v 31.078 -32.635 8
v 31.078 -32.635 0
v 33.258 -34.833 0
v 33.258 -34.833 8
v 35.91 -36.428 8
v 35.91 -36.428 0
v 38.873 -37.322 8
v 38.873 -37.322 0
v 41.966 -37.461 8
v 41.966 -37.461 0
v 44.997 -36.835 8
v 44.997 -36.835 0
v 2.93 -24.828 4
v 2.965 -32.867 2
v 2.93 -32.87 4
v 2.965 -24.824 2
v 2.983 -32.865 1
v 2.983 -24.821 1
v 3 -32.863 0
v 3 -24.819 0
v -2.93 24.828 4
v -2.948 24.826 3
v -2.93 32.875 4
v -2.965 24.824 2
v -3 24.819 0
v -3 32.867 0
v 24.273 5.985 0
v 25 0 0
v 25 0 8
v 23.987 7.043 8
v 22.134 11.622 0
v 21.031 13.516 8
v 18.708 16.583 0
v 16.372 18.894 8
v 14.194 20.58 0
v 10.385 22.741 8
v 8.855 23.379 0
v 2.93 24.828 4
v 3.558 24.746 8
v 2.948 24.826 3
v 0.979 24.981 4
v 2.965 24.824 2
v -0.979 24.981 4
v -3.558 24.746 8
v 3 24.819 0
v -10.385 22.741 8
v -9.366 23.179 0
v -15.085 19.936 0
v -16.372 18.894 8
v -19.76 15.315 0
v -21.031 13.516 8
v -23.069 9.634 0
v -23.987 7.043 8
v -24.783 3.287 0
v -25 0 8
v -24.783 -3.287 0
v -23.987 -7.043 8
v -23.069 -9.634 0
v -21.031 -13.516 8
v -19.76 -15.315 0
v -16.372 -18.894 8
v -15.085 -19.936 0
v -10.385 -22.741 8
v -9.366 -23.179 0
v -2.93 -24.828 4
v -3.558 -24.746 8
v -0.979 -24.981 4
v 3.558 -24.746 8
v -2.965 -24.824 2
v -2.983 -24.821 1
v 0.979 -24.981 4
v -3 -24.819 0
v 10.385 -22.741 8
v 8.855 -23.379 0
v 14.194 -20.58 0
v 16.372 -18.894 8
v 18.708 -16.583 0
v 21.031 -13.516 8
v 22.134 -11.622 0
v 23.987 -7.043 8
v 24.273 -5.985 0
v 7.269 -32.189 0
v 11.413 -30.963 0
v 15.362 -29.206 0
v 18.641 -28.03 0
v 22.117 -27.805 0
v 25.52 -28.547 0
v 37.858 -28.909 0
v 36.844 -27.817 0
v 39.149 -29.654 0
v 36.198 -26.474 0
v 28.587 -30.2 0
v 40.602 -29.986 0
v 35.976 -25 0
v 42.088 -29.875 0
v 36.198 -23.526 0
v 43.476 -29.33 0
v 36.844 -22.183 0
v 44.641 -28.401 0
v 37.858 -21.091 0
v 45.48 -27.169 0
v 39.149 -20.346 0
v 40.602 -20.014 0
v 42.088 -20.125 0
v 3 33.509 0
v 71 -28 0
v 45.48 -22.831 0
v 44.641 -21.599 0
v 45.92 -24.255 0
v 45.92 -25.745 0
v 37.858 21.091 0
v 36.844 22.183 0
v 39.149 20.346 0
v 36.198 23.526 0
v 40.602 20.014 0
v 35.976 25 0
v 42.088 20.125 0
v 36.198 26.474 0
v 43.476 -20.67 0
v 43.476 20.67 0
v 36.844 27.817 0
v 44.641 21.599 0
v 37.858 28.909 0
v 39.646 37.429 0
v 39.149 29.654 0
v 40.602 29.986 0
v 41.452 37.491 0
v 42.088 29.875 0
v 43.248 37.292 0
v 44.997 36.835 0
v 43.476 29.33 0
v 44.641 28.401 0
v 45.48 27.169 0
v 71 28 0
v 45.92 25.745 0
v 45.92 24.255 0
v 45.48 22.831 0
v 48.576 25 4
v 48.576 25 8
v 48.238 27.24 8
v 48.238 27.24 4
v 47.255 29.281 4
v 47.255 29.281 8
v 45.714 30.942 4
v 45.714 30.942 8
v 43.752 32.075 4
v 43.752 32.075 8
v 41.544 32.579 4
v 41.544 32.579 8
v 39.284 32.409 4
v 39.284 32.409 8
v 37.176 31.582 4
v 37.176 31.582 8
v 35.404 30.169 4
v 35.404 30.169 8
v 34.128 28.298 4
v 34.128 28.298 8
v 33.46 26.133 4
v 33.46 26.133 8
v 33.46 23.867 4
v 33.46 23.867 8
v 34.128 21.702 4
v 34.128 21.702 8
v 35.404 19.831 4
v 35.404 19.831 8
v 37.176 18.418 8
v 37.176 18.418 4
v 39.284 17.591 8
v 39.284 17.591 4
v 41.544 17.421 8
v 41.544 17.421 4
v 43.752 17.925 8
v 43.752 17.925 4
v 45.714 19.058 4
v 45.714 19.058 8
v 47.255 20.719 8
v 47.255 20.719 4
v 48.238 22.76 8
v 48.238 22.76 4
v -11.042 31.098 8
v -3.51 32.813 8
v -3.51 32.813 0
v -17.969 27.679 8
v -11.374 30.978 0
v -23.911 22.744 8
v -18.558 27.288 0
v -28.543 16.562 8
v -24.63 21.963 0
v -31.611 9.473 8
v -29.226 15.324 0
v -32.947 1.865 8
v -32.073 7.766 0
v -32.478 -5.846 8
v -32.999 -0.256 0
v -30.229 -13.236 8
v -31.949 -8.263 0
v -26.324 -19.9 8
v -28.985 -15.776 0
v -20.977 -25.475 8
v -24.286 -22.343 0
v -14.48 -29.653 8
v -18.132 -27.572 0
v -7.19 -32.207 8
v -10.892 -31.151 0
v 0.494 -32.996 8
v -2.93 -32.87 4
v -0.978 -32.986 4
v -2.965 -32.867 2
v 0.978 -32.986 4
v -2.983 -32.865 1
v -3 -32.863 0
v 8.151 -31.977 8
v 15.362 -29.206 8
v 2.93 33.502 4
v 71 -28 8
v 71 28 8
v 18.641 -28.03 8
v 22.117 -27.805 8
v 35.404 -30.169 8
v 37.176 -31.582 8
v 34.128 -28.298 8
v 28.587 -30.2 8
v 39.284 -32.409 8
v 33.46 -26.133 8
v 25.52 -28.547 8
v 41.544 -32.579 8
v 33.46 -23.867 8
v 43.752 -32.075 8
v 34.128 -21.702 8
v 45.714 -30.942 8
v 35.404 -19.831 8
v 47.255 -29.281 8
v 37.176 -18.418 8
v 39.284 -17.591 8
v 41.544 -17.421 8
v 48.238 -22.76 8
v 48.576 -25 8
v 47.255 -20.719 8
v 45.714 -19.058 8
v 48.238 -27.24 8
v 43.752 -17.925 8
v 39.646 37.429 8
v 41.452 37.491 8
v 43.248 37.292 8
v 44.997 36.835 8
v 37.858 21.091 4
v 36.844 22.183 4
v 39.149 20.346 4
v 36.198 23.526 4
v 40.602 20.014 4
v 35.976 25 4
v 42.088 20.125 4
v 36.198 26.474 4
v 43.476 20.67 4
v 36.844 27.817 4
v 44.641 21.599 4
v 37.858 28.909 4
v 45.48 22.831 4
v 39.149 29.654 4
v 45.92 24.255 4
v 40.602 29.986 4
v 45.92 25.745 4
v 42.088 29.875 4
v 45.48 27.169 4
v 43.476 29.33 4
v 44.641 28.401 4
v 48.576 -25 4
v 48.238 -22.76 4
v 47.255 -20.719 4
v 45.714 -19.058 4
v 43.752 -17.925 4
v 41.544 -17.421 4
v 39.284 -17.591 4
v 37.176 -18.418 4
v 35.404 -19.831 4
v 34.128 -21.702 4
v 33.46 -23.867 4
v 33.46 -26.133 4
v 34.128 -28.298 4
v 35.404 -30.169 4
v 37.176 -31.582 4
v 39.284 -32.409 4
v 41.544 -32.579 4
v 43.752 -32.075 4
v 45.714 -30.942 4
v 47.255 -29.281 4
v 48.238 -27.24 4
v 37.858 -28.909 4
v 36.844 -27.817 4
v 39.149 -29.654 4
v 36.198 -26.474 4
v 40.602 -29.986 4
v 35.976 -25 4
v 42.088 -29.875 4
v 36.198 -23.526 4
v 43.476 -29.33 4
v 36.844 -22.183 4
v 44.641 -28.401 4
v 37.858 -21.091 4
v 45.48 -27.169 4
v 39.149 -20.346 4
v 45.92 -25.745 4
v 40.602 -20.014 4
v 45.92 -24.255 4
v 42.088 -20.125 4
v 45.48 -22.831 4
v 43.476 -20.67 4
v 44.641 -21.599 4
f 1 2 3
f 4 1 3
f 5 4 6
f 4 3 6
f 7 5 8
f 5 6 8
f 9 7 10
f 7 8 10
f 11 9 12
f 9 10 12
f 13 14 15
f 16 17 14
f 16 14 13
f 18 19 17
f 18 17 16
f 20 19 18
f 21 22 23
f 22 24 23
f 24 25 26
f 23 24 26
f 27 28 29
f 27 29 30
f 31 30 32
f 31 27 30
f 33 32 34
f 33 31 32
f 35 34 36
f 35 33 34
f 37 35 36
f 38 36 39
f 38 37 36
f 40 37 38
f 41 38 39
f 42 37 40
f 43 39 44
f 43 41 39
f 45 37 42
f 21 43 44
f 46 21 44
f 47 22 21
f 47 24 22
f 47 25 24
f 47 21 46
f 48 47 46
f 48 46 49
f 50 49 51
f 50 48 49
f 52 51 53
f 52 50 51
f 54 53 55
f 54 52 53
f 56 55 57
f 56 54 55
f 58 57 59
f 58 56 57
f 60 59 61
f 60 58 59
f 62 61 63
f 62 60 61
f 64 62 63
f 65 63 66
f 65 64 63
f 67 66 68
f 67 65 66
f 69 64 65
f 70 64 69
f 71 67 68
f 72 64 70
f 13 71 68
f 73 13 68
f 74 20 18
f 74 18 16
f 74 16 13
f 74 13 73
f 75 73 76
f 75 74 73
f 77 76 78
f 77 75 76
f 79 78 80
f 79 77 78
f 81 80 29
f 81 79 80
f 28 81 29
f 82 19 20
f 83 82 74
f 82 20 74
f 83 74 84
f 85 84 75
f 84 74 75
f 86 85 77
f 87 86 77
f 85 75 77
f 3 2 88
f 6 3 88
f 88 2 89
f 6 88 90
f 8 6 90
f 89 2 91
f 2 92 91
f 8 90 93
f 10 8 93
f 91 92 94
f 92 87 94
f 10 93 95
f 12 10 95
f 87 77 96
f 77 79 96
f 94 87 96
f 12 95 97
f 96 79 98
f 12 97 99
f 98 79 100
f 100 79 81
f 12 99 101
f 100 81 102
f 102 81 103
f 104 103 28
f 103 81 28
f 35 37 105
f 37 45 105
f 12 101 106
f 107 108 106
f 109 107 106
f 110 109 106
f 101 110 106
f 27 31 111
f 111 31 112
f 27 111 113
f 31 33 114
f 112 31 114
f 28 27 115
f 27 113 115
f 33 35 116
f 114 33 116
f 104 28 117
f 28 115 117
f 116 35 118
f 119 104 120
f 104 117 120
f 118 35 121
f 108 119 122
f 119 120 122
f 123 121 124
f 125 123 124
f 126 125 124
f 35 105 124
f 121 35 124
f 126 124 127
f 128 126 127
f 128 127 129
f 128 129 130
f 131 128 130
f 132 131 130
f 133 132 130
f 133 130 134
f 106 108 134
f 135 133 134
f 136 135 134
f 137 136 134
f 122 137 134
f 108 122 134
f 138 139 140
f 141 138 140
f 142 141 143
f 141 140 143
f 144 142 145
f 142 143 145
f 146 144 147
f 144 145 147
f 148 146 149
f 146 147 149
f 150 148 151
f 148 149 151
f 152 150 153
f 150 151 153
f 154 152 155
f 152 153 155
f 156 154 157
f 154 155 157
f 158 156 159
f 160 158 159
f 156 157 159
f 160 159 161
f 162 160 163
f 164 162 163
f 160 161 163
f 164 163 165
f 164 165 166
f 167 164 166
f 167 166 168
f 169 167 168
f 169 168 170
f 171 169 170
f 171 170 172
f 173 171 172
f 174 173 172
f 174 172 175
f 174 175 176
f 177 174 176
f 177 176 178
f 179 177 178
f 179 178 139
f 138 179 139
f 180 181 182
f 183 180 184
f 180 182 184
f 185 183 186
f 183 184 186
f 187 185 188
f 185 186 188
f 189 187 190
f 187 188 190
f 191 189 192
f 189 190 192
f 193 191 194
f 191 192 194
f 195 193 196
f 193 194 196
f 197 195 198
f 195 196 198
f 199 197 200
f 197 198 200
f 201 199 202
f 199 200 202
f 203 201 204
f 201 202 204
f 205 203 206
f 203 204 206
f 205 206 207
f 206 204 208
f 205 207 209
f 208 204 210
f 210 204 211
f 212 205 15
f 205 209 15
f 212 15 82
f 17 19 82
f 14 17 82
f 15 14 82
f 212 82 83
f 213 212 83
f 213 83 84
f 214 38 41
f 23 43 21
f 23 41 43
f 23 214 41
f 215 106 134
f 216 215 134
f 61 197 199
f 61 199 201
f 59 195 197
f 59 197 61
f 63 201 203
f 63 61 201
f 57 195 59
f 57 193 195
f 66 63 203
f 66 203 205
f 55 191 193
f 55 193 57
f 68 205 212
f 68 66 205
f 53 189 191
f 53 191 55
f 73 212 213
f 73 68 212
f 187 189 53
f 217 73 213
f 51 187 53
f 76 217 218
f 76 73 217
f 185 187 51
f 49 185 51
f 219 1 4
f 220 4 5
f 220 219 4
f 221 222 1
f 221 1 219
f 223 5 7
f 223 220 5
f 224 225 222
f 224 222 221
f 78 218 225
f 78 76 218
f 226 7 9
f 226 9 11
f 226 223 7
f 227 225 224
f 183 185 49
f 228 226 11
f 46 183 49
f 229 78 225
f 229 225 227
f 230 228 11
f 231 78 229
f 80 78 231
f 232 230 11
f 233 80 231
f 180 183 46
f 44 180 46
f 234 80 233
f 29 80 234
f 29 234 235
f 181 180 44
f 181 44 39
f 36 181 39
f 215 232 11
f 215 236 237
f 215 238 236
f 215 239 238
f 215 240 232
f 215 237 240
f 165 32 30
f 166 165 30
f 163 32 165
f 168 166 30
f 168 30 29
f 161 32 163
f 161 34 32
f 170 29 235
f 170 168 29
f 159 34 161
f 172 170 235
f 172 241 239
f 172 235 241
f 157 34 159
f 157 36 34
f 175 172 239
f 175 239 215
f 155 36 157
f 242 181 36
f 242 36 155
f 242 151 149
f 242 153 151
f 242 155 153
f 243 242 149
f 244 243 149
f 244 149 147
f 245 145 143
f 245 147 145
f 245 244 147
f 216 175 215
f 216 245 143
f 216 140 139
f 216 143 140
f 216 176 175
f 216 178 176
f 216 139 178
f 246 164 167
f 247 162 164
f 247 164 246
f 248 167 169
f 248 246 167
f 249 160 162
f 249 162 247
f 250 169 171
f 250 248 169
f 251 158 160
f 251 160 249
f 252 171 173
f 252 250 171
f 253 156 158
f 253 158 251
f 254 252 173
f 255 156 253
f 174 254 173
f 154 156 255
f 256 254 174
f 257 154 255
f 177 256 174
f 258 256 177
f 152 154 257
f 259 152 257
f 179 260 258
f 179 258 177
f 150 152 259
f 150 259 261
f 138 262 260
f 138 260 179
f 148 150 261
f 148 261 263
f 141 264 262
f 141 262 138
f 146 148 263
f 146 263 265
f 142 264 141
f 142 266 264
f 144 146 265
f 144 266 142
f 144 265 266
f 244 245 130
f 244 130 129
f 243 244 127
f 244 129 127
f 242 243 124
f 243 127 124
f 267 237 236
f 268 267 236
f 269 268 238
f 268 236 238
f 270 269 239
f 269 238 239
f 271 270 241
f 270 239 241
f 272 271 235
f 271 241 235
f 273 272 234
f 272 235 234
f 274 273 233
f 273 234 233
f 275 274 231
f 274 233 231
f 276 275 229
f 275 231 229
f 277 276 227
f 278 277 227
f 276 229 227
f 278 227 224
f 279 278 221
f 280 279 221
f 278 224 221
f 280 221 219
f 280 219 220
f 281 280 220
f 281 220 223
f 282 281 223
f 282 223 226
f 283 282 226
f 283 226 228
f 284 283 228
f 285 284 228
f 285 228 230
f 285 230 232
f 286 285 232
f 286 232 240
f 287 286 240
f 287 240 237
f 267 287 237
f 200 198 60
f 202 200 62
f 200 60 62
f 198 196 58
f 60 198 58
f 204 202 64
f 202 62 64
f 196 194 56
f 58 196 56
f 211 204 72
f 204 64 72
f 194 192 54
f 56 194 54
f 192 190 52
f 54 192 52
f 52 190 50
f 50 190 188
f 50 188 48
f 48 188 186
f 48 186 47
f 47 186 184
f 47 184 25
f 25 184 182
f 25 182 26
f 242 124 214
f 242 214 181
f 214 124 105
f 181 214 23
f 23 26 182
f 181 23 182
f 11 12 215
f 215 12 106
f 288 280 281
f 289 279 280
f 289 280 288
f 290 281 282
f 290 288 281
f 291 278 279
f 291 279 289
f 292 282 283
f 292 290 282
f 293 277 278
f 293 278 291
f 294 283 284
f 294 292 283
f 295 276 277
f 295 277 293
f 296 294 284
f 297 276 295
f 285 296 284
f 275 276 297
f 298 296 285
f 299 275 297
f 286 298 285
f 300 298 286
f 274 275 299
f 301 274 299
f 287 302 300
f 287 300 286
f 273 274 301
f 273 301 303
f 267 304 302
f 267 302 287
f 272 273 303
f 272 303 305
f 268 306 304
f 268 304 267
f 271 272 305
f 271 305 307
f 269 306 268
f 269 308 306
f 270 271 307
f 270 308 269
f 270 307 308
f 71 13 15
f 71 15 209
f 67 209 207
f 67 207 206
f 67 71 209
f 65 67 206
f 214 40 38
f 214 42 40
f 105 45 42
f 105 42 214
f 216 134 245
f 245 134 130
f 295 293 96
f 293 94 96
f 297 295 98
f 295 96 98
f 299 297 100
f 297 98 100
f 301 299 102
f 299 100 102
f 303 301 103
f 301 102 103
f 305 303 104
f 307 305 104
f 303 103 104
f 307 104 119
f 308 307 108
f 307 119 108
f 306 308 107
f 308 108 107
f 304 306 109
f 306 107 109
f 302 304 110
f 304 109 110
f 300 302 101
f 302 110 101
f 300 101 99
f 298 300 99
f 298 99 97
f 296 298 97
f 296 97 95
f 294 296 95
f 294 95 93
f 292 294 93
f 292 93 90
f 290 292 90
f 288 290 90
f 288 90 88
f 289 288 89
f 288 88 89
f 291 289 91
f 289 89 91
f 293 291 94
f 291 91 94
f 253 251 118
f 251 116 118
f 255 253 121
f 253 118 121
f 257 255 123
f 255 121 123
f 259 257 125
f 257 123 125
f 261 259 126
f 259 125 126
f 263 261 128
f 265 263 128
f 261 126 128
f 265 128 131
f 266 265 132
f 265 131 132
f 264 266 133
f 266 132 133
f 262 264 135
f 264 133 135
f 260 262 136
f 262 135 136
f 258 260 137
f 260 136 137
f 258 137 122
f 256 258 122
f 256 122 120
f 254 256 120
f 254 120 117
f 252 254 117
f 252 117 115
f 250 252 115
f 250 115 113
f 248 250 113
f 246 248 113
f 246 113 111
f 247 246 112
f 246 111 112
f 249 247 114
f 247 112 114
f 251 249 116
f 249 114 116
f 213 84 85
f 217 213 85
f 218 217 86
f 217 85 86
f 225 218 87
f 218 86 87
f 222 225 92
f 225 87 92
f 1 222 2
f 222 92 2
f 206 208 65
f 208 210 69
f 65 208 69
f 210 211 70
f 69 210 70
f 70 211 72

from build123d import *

# Parameters (mm, degrees)
SKETCH_1_R                = 33
SKETCH_1_R_2              = 25
EXTRUDE_1_DEPTH           = 8
SKETCH_3_W                = 6
SKETCH_3_H                = 75.065219084
CUT_EXTRUDE_1_DEPTH       = 4
CUT_EXTRUDE_1_DRAFT       = -1
HOLE_WIZARD_1_D           = 10
HOLE_WIZARD_1_CBORE_D     = 15.2
HOLE_WIZARD_1_CBORE_DEPTH = 4


with BuildPart() as part:
    # 草图1 → 凸台-拉伸1 (new body)
    # profile 1 of 2: a face of its own
    with BuildSketch(Plane.XY):
        Circle(SKETCH_1_R)
        Circle(SKETCH_1_R_2, mode=Mode.SUBTRACT)
    # profile 2 of 2: a face of its own
    with BuildSketch(Plane.XY):
        with BuildLine():
            Line((39.646094734, 37.429095265), (-3.509900495, 32.8128115))
            ThreePointArc((-3.509900495, 32.8128115), (22.058708979, 24.544110458), (33, 0))
            ThreePointArc((33, 0), (28.248342415, -17.059635132), (15.361748435, -29.206449374))
            ThreePointArc((15.361748435, -29.206449374), (23.844645568, -28.056684557), (31.078097518, -32.63474919))
            ThreePointArc((31.078097518, -32.63474919), (37.364061613, -36.96690321), (44.997122438, -36.835428905))
            Line((44.997122438, -36.835428905), (71, -28))
            Line((71, -28), (71, 28))
            Line((71, 28), (44.997122438, 36.835428905))
            ThreePointArc((44.997122438, 36.835428905), (42.353950178, 37.42377389), (39.646094734, 37.429095265))
        make_face()
    extrude(amount=EXTRUDE_1_DEPTH)


with BuildPart() as cut_extrude_1_tool:
    # 草图3 → 切除-拉伸-薄壁1 (with draft: the straight prism first)
    with BuildSketch(Plane(origin=(0, 0, 0), x_dir=(-1, 0, 0), z_dir=(0, 0, -1))):
        with Locations((0, -0.589324586)):
            Rectangle(SKETCH_3_W, SKETCH_3_H)
    extrude(amount=-CUT_EXTRUDE_1_DEPTH)
    # 切除-拉伸-薄壁1: the draft: its side faces are tilted about the plane it starts from
    cut_extrude_1_sides = [cut_extrude_1_tool.faces().sort_by_distance(p)[0] for p in [
        (3, -0.589324586, 2),
        (0, -38.121934128, 2),
        (-3, -0.589324586, 2),
        (0, 36.943284956, 2),
    ]]
    draft(cut_extrude_1_sides, Plane(origin=(0, 0, 0), x_dir=(-1, 0, 0), z_dir=(0, 0, -1)), CUT_EXTRUDE_1_DRAFT)


with BuildPart() as part_1:
    add(part.part)

    # 切除-拉伸-薄壁1: cut by cut_extrude_1_tool
    add(cut_extrude_1_tool.part, mode=Mode.SUBTRACT)

    # 孔1 (through all)
    with Locations(Plane.XY.offset(8)):
        with Locations((40.975602497, 25), (40.975602497, -25)):
            CounterBoreHole(HOLE_WIZARD_1_D / 2, HOLE_WIZARD_1_CBORE_D / 2, HOLE_WIZARD_1_CBORE_DEPTH)


solid = part_1.part
